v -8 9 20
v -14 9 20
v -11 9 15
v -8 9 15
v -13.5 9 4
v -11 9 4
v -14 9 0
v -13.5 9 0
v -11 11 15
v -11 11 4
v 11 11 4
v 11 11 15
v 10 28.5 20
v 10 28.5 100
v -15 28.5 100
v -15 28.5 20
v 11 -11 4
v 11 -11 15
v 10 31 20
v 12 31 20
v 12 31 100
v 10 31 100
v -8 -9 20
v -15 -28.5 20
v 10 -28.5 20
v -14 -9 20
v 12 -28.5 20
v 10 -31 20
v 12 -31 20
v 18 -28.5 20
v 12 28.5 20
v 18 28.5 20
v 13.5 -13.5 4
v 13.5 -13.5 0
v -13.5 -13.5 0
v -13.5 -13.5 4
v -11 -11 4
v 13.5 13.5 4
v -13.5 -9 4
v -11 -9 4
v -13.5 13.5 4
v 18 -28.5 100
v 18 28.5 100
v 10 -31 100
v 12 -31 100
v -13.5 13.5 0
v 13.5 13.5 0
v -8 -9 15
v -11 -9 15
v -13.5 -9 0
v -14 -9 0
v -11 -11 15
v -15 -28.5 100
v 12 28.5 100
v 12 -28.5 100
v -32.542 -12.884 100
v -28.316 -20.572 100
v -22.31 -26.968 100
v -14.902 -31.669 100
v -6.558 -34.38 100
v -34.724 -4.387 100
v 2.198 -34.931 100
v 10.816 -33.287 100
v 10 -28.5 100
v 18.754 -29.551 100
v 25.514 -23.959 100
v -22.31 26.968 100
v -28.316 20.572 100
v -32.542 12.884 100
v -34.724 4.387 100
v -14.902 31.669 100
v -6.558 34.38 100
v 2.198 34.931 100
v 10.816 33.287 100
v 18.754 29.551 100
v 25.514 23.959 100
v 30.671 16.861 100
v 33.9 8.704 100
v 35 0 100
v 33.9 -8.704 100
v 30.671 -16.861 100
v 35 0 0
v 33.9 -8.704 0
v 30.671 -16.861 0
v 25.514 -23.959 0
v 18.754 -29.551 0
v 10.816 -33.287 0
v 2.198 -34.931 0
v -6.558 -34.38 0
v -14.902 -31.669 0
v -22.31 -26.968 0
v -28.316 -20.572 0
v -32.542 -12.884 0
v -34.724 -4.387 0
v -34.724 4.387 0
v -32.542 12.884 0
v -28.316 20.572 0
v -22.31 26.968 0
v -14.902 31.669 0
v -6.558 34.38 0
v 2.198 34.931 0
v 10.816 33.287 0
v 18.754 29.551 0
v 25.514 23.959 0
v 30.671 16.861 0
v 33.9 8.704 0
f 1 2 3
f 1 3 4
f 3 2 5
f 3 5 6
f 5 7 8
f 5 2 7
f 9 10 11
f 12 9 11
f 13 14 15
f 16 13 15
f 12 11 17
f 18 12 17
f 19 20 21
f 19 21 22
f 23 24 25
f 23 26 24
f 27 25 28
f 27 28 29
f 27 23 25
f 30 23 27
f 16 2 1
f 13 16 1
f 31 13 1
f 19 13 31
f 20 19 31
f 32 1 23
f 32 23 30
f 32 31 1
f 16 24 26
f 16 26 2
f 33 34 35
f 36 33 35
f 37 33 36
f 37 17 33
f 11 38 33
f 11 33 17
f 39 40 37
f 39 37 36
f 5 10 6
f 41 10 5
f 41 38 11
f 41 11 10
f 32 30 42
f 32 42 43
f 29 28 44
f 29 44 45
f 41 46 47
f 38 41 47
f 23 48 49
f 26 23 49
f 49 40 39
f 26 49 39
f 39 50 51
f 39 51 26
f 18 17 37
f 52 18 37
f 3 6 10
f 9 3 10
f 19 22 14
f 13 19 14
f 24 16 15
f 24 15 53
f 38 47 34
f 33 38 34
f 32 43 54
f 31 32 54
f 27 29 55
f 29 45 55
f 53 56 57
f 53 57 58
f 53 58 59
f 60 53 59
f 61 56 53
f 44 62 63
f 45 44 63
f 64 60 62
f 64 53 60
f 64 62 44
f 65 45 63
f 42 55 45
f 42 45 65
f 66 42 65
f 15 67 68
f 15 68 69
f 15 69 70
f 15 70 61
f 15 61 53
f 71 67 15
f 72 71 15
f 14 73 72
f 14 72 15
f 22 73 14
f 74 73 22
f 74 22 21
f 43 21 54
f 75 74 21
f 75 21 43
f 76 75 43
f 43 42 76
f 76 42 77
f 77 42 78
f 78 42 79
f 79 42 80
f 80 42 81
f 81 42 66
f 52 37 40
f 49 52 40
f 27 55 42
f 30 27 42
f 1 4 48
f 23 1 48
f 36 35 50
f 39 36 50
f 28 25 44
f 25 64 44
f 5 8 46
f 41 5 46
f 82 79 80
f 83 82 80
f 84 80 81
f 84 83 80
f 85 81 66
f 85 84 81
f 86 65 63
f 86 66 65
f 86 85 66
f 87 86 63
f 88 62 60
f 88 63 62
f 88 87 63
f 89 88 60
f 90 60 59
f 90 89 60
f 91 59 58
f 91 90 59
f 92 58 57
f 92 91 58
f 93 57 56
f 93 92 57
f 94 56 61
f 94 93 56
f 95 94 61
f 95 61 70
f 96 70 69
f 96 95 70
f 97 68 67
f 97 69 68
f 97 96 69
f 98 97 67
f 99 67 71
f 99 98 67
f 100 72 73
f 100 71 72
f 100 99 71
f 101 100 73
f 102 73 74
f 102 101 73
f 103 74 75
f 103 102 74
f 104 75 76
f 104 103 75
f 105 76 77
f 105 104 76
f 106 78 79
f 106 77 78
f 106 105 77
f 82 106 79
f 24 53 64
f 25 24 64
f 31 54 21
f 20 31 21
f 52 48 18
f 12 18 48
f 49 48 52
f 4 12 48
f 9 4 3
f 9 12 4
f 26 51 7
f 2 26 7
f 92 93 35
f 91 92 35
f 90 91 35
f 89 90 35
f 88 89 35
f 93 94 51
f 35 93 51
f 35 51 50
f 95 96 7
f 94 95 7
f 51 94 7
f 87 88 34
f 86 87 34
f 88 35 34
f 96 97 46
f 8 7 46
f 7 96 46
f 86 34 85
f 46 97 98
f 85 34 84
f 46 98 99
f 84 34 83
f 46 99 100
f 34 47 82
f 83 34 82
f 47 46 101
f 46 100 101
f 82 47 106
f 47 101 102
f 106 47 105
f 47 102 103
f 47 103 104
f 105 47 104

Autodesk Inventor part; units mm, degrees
ref_plane "YZ Plane" through (0, 0, 0) normal (1, 0, 0) x (0, 1, 0)
ref_plane "XZ Plane" through (0, 0, 0) normal (0, 1, 0) x (-1, 0, 0)
ref_plane "XY Plane" through (0, 0, 0) normal (0, 0, 1) x (1, 0, 0)
sketch "Skizze1" plane through (0, 0, 0) normal (0, 0, 1) x (1, 0, 0)
  circle A0 centre (0, 0) radius 35
  dimension "d0" = 70
extrude "Extrusion1" add sketch "Skizze1" along normal blind 100
sketch "Skizze2" plane through (0, 0, 100) normal (0, 0, 1) x (1, 0, 0)
  line L0 (10, -31) -> (12, -31)
  line L1 (12, -31) -> (12, 31)
  line L2 (12, 31) -> (10, 31)
  line L3 (10, 31) -> (10, -31)
  point P0 (0, 0)
  point P1 (10, 0)
  dimension "d3" = 2
  dimension "d4" = 62
  dimension "d5" = 10
extrude "Extrusion2" cut sketch "Skizze2" against normal blind 80
sketch "Skizze3" plane through (0, 0, 100) normal (0, 0, 1) x (1, 0, 0)
  line L0 (-15, -28.5) -> (18, -28.5)
  line L1 (18, -28.5) -> (18, 28.5)
  line L2 (18, 28.5) -> (-15, 28.5)
  line L3 (-15, 28.5) -> (-15, -28.5)
  line L4 (10, -31) -> (10, 31) projected
  point P0 (0, 0)
  point P1 (-15, 0)
  dimension "d8" = 8
  dimension "d9" = 57
  dimension "d10" = 25
extrude "Extrusion3" cut sketch "Skizze3" against normal blind 80
sketch "Skizze4" plane through (0, 0, 0) normal (0, 0, -1) x (-1, 0, 0)
  line L0 (-13.5, -13.5) -> (13.5, -13.5)
  line L1 (13.5, -13.5) -> (13.5, 13.5)
  line L2 (13.5, 13.5) -> (-13.5, 13.5)
  line L3 (-13.5, 13.5) -> (-13.5, -13.5)
  line L4 (-13.5, -13.5) -> (13.5, 13.5) construction
  line L5 (13.5, -13.5) -> (-13.5, 13.5) construction
  point P0 (0, 0)
  dimension "d13" = 27
  dimension "d14" = 27
extrude "Extrusion4" cut sketch "Skizze4" against normal blind 4
sketch "Skizze5" plane through (0, 0, 0) normal (0, 0, -1) x (-1, 0, 0)
  line L0 (-11, -11) -> (11, -11)
  line L1 (11, -11) -> (11, 11)
  line L2 (11, 11) -> (-11, 11)
  line L3 (-11, 11) -> (-11, -11)
  line L4 (-11, -11) -> (11, 11) construction
  line L5 (11, -11) -> (-11, 11) construction
  point P0 (0, 0)
  dimension "d17" = 22
  dimension "d18" = 22
extrude "Extrusion5" cut sketch "Skizze5" against normal blind 15
sketch "Skizze6" plane through (0, 0, 0) normal (0, 0, -1) x (-1, 0, 0)
  line L0 (14, 9) -> (8, 9)
  line L1 (8, 9) -> (8, -9)
  line L2 (8, -9) -> (14, -9)
  line L3 (14, -9) -> (14, 9)
  point P0 (0, 0)
  point P1 (8, 0)
  dimension "d22" = 8
  dimension "d23" = 6
  dimension "d24" = 18
extrude "Extrusion6" cut sketch "Skizze6" against normal through all
equation "\"d13\" = d14"
equation "\"d18\" = d17"
properties part number "Zack-Zack"
